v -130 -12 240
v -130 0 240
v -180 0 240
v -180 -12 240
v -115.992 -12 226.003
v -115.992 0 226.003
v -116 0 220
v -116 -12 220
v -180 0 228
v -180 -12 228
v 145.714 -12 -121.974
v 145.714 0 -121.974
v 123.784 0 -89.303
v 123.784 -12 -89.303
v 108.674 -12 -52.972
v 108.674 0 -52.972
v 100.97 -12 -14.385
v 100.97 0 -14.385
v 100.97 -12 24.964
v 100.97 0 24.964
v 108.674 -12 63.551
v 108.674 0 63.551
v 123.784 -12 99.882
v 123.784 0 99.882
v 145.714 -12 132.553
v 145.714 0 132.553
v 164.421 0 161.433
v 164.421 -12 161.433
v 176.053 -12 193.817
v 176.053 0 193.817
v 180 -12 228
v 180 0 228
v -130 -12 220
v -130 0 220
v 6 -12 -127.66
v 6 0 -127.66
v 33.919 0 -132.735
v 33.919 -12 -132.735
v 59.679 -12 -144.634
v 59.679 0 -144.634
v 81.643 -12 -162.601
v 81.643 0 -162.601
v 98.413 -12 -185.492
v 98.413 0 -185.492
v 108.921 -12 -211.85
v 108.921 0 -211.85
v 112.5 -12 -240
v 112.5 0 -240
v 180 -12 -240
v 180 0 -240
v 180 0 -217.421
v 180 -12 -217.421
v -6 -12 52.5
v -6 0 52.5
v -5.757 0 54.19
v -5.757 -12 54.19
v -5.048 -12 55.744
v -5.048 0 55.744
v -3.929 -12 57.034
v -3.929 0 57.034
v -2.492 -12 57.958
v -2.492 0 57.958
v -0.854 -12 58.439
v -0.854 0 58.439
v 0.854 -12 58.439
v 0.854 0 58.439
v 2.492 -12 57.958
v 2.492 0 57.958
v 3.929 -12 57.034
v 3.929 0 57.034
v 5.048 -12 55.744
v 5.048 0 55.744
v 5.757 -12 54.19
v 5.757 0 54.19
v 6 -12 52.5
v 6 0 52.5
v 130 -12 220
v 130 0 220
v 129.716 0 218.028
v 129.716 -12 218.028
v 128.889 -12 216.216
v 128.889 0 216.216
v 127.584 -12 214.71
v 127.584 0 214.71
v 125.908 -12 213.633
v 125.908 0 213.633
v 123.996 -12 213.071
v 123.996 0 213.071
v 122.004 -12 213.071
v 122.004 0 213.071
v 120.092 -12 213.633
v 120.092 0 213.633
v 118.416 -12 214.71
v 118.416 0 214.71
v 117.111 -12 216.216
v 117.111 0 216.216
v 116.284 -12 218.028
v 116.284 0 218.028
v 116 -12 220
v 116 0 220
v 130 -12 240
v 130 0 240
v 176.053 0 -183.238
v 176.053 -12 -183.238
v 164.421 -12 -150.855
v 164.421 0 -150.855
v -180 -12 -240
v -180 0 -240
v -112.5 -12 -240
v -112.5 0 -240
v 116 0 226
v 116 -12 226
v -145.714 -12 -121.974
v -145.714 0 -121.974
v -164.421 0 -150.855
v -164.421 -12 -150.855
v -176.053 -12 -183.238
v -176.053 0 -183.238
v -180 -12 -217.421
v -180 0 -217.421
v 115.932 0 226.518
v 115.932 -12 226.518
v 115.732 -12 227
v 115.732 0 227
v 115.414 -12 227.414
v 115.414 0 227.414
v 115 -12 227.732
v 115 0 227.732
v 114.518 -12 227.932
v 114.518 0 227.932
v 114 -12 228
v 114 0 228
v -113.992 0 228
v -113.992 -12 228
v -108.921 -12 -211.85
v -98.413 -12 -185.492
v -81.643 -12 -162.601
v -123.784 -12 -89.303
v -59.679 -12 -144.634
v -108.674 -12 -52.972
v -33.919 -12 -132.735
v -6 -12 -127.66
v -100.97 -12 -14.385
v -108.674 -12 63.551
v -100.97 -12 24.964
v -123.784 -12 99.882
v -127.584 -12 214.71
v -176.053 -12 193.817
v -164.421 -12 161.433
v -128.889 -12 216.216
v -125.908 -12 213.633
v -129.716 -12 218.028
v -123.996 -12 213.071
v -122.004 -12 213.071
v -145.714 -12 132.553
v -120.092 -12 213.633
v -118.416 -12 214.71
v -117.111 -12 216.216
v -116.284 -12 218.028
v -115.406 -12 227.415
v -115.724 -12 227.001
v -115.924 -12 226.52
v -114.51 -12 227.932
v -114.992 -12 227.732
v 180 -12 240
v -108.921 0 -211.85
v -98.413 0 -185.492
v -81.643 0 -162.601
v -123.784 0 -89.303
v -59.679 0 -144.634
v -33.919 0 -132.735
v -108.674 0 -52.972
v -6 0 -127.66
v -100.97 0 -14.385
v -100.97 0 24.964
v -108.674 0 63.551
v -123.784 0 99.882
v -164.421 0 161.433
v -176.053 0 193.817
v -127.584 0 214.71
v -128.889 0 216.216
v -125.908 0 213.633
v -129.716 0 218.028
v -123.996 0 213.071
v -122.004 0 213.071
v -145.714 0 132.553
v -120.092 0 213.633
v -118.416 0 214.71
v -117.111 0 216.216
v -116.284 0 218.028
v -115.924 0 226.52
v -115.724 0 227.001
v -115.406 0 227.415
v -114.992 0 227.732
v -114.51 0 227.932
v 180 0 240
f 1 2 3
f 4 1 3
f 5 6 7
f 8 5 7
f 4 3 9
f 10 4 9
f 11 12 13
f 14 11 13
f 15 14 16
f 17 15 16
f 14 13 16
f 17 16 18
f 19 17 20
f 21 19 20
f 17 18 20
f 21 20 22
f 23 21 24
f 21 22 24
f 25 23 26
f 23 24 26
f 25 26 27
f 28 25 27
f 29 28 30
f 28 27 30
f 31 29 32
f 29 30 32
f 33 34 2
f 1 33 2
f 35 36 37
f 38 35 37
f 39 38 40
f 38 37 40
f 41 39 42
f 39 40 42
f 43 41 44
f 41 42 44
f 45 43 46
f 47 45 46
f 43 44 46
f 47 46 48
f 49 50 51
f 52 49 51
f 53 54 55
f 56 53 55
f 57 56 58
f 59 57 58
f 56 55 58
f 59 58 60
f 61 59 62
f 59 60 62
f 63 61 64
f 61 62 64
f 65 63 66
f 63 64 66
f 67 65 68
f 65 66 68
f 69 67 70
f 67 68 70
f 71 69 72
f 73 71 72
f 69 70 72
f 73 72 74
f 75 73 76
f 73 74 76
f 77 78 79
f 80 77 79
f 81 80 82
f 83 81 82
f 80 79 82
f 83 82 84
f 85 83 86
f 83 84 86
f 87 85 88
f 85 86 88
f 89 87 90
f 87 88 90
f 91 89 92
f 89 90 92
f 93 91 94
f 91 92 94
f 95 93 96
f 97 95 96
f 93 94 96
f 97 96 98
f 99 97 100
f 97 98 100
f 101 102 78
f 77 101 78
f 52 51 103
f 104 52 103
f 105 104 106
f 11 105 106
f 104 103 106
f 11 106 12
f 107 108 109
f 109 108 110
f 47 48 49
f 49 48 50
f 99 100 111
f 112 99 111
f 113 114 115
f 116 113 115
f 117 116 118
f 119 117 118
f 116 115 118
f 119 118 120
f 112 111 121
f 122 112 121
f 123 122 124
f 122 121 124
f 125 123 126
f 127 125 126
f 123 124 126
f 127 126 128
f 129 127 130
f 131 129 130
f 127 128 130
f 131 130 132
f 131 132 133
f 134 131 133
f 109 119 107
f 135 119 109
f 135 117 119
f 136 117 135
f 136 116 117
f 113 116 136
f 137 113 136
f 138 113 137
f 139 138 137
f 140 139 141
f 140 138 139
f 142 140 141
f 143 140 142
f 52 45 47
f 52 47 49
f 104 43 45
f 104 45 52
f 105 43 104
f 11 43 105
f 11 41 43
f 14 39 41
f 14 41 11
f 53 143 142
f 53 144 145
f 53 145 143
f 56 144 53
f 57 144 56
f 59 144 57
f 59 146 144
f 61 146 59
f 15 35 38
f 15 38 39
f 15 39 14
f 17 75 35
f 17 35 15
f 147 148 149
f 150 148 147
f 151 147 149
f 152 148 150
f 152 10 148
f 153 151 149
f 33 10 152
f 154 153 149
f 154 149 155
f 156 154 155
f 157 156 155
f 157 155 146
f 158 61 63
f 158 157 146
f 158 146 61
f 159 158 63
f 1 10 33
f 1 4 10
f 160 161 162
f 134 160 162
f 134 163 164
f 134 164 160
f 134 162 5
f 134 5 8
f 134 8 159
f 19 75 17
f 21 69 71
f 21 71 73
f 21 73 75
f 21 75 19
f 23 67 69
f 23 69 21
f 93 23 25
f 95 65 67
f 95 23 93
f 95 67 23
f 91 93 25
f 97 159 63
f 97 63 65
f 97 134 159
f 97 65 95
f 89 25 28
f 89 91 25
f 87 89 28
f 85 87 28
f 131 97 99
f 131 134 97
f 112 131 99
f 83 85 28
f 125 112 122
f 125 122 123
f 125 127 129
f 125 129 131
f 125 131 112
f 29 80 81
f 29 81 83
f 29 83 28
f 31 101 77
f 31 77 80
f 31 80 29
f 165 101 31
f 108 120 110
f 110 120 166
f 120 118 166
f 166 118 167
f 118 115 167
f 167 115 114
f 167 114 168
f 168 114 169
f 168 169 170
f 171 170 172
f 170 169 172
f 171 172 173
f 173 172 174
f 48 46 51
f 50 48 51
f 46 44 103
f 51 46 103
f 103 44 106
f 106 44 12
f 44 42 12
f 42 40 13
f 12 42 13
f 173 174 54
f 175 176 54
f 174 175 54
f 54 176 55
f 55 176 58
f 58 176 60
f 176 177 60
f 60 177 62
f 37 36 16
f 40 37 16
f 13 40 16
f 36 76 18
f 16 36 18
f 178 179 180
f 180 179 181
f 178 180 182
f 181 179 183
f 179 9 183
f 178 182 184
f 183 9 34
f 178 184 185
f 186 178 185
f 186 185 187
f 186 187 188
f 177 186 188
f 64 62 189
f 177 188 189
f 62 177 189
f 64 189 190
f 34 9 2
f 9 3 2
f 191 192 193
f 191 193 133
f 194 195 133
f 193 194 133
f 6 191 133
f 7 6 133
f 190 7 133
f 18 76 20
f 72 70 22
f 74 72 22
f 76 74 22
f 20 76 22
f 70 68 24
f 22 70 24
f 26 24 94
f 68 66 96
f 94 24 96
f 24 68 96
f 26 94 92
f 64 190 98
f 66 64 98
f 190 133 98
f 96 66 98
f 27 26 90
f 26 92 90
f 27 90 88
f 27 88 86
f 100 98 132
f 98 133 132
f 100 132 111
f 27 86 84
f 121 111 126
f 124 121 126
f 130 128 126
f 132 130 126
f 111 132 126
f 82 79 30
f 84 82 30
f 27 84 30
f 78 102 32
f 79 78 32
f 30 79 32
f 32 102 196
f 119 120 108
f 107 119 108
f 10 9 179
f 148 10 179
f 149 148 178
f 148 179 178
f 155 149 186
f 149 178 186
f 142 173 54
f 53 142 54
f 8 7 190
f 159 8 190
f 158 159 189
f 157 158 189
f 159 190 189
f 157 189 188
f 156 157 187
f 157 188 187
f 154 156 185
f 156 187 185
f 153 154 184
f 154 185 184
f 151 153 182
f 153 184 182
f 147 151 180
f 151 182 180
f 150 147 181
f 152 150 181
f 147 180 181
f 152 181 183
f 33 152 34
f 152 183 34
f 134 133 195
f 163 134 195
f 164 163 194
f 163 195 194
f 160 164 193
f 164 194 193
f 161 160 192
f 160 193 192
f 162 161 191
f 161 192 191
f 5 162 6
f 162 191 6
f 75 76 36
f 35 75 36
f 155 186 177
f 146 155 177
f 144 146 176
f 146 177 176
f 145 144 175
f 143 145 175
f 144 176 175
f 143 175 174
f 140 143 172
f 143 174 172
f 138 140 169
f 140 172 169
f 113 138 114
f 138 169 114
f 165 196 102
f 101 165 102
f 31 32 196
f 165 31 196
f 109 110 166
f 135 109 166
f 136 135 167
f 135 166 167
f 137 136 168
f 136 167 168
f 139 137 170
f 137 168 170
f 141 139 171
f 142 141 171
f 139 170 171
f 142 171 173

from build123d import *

# Parameters (mm, degrees)
F1_DEPTH = 12


with BuildPart() as f1:
    # F0 (on Front) → F1 (new body)
    with BuildSketch(Plane.XZ):
        with BuildLine():
            Line((-180, -217.421149), (-180, -240))
            Line((-180, -240), (-112.5, -240))
            ThreePointArc((-112.5, -240), (-81.643279, -162.600872), (-6, -127.660114))
            Line((-6, -127.660114), (-6, 52.5))
            ThreePointArc((-6, 52.5), (0, 58.5), (6, 52.5))
            Line((6, 52.5), (6, -127.660114))
            ThreePointArc((6, -127.660114), (81.643279, -162.600872), (112.5, -240))
            Line((112.5, -240), (180, -240))
            Line((180, -240), (180, -217.421149))
            ThreePointArc((180, -217.421149), (171.168592, -166.711894), (145.714286, -121.97376))
            ThreePointArc((145.714286, -121.97376), (100, 5.289425), (145.714286, 132.552611))
            ThreePointArc((145.714286, 132.552611), (171.168592, 177.290745), (180, 228))
            Line((180, 228), (180, 240))
            Line((180, 240), (130, 240))
            Line((130, 240), (130, 228))
            Line((130, 228), (130, 220))
            ThreePointArc((130, 220), (123, 213), (116, 220))
            Line((116, 220), (116, 226))
            ThreePointArc((116, 226), (115.414214, 227.414214), (114, 228))
            Line((114, 228), (-113.99243, 228))
            ThreePointArc((-113.99243, 228), (-115.405751, 227.415105), (-115.992428, 226.002523))
            Line((-115.992428, 226.002523), (-116, 220))
            ThreePointArc((-116, 220), (-123, 213), (-130, 220))
            Line((-130, 220), (-130, 228))
            Line((-130, 228), (-130, 240))
            Line((-130, 240), (-180, 240))
            Line((-180, 240), (-180, 228))
            ThreePointArc((-180, 228), (-171.168592, 177.290745), (-145.714286, 132.552611))
            ThreePointArc((-145.714286, 132.552611), (-100, 5.289425), (-145.714286, -121.97376))
            ThreePointArc((-145.714286, -121.97376), (-171.168592, -166.711894), (-180, -217.421149))
        make_face()
    extrude(amount=F1_DEPTH)


solid = f1.part
